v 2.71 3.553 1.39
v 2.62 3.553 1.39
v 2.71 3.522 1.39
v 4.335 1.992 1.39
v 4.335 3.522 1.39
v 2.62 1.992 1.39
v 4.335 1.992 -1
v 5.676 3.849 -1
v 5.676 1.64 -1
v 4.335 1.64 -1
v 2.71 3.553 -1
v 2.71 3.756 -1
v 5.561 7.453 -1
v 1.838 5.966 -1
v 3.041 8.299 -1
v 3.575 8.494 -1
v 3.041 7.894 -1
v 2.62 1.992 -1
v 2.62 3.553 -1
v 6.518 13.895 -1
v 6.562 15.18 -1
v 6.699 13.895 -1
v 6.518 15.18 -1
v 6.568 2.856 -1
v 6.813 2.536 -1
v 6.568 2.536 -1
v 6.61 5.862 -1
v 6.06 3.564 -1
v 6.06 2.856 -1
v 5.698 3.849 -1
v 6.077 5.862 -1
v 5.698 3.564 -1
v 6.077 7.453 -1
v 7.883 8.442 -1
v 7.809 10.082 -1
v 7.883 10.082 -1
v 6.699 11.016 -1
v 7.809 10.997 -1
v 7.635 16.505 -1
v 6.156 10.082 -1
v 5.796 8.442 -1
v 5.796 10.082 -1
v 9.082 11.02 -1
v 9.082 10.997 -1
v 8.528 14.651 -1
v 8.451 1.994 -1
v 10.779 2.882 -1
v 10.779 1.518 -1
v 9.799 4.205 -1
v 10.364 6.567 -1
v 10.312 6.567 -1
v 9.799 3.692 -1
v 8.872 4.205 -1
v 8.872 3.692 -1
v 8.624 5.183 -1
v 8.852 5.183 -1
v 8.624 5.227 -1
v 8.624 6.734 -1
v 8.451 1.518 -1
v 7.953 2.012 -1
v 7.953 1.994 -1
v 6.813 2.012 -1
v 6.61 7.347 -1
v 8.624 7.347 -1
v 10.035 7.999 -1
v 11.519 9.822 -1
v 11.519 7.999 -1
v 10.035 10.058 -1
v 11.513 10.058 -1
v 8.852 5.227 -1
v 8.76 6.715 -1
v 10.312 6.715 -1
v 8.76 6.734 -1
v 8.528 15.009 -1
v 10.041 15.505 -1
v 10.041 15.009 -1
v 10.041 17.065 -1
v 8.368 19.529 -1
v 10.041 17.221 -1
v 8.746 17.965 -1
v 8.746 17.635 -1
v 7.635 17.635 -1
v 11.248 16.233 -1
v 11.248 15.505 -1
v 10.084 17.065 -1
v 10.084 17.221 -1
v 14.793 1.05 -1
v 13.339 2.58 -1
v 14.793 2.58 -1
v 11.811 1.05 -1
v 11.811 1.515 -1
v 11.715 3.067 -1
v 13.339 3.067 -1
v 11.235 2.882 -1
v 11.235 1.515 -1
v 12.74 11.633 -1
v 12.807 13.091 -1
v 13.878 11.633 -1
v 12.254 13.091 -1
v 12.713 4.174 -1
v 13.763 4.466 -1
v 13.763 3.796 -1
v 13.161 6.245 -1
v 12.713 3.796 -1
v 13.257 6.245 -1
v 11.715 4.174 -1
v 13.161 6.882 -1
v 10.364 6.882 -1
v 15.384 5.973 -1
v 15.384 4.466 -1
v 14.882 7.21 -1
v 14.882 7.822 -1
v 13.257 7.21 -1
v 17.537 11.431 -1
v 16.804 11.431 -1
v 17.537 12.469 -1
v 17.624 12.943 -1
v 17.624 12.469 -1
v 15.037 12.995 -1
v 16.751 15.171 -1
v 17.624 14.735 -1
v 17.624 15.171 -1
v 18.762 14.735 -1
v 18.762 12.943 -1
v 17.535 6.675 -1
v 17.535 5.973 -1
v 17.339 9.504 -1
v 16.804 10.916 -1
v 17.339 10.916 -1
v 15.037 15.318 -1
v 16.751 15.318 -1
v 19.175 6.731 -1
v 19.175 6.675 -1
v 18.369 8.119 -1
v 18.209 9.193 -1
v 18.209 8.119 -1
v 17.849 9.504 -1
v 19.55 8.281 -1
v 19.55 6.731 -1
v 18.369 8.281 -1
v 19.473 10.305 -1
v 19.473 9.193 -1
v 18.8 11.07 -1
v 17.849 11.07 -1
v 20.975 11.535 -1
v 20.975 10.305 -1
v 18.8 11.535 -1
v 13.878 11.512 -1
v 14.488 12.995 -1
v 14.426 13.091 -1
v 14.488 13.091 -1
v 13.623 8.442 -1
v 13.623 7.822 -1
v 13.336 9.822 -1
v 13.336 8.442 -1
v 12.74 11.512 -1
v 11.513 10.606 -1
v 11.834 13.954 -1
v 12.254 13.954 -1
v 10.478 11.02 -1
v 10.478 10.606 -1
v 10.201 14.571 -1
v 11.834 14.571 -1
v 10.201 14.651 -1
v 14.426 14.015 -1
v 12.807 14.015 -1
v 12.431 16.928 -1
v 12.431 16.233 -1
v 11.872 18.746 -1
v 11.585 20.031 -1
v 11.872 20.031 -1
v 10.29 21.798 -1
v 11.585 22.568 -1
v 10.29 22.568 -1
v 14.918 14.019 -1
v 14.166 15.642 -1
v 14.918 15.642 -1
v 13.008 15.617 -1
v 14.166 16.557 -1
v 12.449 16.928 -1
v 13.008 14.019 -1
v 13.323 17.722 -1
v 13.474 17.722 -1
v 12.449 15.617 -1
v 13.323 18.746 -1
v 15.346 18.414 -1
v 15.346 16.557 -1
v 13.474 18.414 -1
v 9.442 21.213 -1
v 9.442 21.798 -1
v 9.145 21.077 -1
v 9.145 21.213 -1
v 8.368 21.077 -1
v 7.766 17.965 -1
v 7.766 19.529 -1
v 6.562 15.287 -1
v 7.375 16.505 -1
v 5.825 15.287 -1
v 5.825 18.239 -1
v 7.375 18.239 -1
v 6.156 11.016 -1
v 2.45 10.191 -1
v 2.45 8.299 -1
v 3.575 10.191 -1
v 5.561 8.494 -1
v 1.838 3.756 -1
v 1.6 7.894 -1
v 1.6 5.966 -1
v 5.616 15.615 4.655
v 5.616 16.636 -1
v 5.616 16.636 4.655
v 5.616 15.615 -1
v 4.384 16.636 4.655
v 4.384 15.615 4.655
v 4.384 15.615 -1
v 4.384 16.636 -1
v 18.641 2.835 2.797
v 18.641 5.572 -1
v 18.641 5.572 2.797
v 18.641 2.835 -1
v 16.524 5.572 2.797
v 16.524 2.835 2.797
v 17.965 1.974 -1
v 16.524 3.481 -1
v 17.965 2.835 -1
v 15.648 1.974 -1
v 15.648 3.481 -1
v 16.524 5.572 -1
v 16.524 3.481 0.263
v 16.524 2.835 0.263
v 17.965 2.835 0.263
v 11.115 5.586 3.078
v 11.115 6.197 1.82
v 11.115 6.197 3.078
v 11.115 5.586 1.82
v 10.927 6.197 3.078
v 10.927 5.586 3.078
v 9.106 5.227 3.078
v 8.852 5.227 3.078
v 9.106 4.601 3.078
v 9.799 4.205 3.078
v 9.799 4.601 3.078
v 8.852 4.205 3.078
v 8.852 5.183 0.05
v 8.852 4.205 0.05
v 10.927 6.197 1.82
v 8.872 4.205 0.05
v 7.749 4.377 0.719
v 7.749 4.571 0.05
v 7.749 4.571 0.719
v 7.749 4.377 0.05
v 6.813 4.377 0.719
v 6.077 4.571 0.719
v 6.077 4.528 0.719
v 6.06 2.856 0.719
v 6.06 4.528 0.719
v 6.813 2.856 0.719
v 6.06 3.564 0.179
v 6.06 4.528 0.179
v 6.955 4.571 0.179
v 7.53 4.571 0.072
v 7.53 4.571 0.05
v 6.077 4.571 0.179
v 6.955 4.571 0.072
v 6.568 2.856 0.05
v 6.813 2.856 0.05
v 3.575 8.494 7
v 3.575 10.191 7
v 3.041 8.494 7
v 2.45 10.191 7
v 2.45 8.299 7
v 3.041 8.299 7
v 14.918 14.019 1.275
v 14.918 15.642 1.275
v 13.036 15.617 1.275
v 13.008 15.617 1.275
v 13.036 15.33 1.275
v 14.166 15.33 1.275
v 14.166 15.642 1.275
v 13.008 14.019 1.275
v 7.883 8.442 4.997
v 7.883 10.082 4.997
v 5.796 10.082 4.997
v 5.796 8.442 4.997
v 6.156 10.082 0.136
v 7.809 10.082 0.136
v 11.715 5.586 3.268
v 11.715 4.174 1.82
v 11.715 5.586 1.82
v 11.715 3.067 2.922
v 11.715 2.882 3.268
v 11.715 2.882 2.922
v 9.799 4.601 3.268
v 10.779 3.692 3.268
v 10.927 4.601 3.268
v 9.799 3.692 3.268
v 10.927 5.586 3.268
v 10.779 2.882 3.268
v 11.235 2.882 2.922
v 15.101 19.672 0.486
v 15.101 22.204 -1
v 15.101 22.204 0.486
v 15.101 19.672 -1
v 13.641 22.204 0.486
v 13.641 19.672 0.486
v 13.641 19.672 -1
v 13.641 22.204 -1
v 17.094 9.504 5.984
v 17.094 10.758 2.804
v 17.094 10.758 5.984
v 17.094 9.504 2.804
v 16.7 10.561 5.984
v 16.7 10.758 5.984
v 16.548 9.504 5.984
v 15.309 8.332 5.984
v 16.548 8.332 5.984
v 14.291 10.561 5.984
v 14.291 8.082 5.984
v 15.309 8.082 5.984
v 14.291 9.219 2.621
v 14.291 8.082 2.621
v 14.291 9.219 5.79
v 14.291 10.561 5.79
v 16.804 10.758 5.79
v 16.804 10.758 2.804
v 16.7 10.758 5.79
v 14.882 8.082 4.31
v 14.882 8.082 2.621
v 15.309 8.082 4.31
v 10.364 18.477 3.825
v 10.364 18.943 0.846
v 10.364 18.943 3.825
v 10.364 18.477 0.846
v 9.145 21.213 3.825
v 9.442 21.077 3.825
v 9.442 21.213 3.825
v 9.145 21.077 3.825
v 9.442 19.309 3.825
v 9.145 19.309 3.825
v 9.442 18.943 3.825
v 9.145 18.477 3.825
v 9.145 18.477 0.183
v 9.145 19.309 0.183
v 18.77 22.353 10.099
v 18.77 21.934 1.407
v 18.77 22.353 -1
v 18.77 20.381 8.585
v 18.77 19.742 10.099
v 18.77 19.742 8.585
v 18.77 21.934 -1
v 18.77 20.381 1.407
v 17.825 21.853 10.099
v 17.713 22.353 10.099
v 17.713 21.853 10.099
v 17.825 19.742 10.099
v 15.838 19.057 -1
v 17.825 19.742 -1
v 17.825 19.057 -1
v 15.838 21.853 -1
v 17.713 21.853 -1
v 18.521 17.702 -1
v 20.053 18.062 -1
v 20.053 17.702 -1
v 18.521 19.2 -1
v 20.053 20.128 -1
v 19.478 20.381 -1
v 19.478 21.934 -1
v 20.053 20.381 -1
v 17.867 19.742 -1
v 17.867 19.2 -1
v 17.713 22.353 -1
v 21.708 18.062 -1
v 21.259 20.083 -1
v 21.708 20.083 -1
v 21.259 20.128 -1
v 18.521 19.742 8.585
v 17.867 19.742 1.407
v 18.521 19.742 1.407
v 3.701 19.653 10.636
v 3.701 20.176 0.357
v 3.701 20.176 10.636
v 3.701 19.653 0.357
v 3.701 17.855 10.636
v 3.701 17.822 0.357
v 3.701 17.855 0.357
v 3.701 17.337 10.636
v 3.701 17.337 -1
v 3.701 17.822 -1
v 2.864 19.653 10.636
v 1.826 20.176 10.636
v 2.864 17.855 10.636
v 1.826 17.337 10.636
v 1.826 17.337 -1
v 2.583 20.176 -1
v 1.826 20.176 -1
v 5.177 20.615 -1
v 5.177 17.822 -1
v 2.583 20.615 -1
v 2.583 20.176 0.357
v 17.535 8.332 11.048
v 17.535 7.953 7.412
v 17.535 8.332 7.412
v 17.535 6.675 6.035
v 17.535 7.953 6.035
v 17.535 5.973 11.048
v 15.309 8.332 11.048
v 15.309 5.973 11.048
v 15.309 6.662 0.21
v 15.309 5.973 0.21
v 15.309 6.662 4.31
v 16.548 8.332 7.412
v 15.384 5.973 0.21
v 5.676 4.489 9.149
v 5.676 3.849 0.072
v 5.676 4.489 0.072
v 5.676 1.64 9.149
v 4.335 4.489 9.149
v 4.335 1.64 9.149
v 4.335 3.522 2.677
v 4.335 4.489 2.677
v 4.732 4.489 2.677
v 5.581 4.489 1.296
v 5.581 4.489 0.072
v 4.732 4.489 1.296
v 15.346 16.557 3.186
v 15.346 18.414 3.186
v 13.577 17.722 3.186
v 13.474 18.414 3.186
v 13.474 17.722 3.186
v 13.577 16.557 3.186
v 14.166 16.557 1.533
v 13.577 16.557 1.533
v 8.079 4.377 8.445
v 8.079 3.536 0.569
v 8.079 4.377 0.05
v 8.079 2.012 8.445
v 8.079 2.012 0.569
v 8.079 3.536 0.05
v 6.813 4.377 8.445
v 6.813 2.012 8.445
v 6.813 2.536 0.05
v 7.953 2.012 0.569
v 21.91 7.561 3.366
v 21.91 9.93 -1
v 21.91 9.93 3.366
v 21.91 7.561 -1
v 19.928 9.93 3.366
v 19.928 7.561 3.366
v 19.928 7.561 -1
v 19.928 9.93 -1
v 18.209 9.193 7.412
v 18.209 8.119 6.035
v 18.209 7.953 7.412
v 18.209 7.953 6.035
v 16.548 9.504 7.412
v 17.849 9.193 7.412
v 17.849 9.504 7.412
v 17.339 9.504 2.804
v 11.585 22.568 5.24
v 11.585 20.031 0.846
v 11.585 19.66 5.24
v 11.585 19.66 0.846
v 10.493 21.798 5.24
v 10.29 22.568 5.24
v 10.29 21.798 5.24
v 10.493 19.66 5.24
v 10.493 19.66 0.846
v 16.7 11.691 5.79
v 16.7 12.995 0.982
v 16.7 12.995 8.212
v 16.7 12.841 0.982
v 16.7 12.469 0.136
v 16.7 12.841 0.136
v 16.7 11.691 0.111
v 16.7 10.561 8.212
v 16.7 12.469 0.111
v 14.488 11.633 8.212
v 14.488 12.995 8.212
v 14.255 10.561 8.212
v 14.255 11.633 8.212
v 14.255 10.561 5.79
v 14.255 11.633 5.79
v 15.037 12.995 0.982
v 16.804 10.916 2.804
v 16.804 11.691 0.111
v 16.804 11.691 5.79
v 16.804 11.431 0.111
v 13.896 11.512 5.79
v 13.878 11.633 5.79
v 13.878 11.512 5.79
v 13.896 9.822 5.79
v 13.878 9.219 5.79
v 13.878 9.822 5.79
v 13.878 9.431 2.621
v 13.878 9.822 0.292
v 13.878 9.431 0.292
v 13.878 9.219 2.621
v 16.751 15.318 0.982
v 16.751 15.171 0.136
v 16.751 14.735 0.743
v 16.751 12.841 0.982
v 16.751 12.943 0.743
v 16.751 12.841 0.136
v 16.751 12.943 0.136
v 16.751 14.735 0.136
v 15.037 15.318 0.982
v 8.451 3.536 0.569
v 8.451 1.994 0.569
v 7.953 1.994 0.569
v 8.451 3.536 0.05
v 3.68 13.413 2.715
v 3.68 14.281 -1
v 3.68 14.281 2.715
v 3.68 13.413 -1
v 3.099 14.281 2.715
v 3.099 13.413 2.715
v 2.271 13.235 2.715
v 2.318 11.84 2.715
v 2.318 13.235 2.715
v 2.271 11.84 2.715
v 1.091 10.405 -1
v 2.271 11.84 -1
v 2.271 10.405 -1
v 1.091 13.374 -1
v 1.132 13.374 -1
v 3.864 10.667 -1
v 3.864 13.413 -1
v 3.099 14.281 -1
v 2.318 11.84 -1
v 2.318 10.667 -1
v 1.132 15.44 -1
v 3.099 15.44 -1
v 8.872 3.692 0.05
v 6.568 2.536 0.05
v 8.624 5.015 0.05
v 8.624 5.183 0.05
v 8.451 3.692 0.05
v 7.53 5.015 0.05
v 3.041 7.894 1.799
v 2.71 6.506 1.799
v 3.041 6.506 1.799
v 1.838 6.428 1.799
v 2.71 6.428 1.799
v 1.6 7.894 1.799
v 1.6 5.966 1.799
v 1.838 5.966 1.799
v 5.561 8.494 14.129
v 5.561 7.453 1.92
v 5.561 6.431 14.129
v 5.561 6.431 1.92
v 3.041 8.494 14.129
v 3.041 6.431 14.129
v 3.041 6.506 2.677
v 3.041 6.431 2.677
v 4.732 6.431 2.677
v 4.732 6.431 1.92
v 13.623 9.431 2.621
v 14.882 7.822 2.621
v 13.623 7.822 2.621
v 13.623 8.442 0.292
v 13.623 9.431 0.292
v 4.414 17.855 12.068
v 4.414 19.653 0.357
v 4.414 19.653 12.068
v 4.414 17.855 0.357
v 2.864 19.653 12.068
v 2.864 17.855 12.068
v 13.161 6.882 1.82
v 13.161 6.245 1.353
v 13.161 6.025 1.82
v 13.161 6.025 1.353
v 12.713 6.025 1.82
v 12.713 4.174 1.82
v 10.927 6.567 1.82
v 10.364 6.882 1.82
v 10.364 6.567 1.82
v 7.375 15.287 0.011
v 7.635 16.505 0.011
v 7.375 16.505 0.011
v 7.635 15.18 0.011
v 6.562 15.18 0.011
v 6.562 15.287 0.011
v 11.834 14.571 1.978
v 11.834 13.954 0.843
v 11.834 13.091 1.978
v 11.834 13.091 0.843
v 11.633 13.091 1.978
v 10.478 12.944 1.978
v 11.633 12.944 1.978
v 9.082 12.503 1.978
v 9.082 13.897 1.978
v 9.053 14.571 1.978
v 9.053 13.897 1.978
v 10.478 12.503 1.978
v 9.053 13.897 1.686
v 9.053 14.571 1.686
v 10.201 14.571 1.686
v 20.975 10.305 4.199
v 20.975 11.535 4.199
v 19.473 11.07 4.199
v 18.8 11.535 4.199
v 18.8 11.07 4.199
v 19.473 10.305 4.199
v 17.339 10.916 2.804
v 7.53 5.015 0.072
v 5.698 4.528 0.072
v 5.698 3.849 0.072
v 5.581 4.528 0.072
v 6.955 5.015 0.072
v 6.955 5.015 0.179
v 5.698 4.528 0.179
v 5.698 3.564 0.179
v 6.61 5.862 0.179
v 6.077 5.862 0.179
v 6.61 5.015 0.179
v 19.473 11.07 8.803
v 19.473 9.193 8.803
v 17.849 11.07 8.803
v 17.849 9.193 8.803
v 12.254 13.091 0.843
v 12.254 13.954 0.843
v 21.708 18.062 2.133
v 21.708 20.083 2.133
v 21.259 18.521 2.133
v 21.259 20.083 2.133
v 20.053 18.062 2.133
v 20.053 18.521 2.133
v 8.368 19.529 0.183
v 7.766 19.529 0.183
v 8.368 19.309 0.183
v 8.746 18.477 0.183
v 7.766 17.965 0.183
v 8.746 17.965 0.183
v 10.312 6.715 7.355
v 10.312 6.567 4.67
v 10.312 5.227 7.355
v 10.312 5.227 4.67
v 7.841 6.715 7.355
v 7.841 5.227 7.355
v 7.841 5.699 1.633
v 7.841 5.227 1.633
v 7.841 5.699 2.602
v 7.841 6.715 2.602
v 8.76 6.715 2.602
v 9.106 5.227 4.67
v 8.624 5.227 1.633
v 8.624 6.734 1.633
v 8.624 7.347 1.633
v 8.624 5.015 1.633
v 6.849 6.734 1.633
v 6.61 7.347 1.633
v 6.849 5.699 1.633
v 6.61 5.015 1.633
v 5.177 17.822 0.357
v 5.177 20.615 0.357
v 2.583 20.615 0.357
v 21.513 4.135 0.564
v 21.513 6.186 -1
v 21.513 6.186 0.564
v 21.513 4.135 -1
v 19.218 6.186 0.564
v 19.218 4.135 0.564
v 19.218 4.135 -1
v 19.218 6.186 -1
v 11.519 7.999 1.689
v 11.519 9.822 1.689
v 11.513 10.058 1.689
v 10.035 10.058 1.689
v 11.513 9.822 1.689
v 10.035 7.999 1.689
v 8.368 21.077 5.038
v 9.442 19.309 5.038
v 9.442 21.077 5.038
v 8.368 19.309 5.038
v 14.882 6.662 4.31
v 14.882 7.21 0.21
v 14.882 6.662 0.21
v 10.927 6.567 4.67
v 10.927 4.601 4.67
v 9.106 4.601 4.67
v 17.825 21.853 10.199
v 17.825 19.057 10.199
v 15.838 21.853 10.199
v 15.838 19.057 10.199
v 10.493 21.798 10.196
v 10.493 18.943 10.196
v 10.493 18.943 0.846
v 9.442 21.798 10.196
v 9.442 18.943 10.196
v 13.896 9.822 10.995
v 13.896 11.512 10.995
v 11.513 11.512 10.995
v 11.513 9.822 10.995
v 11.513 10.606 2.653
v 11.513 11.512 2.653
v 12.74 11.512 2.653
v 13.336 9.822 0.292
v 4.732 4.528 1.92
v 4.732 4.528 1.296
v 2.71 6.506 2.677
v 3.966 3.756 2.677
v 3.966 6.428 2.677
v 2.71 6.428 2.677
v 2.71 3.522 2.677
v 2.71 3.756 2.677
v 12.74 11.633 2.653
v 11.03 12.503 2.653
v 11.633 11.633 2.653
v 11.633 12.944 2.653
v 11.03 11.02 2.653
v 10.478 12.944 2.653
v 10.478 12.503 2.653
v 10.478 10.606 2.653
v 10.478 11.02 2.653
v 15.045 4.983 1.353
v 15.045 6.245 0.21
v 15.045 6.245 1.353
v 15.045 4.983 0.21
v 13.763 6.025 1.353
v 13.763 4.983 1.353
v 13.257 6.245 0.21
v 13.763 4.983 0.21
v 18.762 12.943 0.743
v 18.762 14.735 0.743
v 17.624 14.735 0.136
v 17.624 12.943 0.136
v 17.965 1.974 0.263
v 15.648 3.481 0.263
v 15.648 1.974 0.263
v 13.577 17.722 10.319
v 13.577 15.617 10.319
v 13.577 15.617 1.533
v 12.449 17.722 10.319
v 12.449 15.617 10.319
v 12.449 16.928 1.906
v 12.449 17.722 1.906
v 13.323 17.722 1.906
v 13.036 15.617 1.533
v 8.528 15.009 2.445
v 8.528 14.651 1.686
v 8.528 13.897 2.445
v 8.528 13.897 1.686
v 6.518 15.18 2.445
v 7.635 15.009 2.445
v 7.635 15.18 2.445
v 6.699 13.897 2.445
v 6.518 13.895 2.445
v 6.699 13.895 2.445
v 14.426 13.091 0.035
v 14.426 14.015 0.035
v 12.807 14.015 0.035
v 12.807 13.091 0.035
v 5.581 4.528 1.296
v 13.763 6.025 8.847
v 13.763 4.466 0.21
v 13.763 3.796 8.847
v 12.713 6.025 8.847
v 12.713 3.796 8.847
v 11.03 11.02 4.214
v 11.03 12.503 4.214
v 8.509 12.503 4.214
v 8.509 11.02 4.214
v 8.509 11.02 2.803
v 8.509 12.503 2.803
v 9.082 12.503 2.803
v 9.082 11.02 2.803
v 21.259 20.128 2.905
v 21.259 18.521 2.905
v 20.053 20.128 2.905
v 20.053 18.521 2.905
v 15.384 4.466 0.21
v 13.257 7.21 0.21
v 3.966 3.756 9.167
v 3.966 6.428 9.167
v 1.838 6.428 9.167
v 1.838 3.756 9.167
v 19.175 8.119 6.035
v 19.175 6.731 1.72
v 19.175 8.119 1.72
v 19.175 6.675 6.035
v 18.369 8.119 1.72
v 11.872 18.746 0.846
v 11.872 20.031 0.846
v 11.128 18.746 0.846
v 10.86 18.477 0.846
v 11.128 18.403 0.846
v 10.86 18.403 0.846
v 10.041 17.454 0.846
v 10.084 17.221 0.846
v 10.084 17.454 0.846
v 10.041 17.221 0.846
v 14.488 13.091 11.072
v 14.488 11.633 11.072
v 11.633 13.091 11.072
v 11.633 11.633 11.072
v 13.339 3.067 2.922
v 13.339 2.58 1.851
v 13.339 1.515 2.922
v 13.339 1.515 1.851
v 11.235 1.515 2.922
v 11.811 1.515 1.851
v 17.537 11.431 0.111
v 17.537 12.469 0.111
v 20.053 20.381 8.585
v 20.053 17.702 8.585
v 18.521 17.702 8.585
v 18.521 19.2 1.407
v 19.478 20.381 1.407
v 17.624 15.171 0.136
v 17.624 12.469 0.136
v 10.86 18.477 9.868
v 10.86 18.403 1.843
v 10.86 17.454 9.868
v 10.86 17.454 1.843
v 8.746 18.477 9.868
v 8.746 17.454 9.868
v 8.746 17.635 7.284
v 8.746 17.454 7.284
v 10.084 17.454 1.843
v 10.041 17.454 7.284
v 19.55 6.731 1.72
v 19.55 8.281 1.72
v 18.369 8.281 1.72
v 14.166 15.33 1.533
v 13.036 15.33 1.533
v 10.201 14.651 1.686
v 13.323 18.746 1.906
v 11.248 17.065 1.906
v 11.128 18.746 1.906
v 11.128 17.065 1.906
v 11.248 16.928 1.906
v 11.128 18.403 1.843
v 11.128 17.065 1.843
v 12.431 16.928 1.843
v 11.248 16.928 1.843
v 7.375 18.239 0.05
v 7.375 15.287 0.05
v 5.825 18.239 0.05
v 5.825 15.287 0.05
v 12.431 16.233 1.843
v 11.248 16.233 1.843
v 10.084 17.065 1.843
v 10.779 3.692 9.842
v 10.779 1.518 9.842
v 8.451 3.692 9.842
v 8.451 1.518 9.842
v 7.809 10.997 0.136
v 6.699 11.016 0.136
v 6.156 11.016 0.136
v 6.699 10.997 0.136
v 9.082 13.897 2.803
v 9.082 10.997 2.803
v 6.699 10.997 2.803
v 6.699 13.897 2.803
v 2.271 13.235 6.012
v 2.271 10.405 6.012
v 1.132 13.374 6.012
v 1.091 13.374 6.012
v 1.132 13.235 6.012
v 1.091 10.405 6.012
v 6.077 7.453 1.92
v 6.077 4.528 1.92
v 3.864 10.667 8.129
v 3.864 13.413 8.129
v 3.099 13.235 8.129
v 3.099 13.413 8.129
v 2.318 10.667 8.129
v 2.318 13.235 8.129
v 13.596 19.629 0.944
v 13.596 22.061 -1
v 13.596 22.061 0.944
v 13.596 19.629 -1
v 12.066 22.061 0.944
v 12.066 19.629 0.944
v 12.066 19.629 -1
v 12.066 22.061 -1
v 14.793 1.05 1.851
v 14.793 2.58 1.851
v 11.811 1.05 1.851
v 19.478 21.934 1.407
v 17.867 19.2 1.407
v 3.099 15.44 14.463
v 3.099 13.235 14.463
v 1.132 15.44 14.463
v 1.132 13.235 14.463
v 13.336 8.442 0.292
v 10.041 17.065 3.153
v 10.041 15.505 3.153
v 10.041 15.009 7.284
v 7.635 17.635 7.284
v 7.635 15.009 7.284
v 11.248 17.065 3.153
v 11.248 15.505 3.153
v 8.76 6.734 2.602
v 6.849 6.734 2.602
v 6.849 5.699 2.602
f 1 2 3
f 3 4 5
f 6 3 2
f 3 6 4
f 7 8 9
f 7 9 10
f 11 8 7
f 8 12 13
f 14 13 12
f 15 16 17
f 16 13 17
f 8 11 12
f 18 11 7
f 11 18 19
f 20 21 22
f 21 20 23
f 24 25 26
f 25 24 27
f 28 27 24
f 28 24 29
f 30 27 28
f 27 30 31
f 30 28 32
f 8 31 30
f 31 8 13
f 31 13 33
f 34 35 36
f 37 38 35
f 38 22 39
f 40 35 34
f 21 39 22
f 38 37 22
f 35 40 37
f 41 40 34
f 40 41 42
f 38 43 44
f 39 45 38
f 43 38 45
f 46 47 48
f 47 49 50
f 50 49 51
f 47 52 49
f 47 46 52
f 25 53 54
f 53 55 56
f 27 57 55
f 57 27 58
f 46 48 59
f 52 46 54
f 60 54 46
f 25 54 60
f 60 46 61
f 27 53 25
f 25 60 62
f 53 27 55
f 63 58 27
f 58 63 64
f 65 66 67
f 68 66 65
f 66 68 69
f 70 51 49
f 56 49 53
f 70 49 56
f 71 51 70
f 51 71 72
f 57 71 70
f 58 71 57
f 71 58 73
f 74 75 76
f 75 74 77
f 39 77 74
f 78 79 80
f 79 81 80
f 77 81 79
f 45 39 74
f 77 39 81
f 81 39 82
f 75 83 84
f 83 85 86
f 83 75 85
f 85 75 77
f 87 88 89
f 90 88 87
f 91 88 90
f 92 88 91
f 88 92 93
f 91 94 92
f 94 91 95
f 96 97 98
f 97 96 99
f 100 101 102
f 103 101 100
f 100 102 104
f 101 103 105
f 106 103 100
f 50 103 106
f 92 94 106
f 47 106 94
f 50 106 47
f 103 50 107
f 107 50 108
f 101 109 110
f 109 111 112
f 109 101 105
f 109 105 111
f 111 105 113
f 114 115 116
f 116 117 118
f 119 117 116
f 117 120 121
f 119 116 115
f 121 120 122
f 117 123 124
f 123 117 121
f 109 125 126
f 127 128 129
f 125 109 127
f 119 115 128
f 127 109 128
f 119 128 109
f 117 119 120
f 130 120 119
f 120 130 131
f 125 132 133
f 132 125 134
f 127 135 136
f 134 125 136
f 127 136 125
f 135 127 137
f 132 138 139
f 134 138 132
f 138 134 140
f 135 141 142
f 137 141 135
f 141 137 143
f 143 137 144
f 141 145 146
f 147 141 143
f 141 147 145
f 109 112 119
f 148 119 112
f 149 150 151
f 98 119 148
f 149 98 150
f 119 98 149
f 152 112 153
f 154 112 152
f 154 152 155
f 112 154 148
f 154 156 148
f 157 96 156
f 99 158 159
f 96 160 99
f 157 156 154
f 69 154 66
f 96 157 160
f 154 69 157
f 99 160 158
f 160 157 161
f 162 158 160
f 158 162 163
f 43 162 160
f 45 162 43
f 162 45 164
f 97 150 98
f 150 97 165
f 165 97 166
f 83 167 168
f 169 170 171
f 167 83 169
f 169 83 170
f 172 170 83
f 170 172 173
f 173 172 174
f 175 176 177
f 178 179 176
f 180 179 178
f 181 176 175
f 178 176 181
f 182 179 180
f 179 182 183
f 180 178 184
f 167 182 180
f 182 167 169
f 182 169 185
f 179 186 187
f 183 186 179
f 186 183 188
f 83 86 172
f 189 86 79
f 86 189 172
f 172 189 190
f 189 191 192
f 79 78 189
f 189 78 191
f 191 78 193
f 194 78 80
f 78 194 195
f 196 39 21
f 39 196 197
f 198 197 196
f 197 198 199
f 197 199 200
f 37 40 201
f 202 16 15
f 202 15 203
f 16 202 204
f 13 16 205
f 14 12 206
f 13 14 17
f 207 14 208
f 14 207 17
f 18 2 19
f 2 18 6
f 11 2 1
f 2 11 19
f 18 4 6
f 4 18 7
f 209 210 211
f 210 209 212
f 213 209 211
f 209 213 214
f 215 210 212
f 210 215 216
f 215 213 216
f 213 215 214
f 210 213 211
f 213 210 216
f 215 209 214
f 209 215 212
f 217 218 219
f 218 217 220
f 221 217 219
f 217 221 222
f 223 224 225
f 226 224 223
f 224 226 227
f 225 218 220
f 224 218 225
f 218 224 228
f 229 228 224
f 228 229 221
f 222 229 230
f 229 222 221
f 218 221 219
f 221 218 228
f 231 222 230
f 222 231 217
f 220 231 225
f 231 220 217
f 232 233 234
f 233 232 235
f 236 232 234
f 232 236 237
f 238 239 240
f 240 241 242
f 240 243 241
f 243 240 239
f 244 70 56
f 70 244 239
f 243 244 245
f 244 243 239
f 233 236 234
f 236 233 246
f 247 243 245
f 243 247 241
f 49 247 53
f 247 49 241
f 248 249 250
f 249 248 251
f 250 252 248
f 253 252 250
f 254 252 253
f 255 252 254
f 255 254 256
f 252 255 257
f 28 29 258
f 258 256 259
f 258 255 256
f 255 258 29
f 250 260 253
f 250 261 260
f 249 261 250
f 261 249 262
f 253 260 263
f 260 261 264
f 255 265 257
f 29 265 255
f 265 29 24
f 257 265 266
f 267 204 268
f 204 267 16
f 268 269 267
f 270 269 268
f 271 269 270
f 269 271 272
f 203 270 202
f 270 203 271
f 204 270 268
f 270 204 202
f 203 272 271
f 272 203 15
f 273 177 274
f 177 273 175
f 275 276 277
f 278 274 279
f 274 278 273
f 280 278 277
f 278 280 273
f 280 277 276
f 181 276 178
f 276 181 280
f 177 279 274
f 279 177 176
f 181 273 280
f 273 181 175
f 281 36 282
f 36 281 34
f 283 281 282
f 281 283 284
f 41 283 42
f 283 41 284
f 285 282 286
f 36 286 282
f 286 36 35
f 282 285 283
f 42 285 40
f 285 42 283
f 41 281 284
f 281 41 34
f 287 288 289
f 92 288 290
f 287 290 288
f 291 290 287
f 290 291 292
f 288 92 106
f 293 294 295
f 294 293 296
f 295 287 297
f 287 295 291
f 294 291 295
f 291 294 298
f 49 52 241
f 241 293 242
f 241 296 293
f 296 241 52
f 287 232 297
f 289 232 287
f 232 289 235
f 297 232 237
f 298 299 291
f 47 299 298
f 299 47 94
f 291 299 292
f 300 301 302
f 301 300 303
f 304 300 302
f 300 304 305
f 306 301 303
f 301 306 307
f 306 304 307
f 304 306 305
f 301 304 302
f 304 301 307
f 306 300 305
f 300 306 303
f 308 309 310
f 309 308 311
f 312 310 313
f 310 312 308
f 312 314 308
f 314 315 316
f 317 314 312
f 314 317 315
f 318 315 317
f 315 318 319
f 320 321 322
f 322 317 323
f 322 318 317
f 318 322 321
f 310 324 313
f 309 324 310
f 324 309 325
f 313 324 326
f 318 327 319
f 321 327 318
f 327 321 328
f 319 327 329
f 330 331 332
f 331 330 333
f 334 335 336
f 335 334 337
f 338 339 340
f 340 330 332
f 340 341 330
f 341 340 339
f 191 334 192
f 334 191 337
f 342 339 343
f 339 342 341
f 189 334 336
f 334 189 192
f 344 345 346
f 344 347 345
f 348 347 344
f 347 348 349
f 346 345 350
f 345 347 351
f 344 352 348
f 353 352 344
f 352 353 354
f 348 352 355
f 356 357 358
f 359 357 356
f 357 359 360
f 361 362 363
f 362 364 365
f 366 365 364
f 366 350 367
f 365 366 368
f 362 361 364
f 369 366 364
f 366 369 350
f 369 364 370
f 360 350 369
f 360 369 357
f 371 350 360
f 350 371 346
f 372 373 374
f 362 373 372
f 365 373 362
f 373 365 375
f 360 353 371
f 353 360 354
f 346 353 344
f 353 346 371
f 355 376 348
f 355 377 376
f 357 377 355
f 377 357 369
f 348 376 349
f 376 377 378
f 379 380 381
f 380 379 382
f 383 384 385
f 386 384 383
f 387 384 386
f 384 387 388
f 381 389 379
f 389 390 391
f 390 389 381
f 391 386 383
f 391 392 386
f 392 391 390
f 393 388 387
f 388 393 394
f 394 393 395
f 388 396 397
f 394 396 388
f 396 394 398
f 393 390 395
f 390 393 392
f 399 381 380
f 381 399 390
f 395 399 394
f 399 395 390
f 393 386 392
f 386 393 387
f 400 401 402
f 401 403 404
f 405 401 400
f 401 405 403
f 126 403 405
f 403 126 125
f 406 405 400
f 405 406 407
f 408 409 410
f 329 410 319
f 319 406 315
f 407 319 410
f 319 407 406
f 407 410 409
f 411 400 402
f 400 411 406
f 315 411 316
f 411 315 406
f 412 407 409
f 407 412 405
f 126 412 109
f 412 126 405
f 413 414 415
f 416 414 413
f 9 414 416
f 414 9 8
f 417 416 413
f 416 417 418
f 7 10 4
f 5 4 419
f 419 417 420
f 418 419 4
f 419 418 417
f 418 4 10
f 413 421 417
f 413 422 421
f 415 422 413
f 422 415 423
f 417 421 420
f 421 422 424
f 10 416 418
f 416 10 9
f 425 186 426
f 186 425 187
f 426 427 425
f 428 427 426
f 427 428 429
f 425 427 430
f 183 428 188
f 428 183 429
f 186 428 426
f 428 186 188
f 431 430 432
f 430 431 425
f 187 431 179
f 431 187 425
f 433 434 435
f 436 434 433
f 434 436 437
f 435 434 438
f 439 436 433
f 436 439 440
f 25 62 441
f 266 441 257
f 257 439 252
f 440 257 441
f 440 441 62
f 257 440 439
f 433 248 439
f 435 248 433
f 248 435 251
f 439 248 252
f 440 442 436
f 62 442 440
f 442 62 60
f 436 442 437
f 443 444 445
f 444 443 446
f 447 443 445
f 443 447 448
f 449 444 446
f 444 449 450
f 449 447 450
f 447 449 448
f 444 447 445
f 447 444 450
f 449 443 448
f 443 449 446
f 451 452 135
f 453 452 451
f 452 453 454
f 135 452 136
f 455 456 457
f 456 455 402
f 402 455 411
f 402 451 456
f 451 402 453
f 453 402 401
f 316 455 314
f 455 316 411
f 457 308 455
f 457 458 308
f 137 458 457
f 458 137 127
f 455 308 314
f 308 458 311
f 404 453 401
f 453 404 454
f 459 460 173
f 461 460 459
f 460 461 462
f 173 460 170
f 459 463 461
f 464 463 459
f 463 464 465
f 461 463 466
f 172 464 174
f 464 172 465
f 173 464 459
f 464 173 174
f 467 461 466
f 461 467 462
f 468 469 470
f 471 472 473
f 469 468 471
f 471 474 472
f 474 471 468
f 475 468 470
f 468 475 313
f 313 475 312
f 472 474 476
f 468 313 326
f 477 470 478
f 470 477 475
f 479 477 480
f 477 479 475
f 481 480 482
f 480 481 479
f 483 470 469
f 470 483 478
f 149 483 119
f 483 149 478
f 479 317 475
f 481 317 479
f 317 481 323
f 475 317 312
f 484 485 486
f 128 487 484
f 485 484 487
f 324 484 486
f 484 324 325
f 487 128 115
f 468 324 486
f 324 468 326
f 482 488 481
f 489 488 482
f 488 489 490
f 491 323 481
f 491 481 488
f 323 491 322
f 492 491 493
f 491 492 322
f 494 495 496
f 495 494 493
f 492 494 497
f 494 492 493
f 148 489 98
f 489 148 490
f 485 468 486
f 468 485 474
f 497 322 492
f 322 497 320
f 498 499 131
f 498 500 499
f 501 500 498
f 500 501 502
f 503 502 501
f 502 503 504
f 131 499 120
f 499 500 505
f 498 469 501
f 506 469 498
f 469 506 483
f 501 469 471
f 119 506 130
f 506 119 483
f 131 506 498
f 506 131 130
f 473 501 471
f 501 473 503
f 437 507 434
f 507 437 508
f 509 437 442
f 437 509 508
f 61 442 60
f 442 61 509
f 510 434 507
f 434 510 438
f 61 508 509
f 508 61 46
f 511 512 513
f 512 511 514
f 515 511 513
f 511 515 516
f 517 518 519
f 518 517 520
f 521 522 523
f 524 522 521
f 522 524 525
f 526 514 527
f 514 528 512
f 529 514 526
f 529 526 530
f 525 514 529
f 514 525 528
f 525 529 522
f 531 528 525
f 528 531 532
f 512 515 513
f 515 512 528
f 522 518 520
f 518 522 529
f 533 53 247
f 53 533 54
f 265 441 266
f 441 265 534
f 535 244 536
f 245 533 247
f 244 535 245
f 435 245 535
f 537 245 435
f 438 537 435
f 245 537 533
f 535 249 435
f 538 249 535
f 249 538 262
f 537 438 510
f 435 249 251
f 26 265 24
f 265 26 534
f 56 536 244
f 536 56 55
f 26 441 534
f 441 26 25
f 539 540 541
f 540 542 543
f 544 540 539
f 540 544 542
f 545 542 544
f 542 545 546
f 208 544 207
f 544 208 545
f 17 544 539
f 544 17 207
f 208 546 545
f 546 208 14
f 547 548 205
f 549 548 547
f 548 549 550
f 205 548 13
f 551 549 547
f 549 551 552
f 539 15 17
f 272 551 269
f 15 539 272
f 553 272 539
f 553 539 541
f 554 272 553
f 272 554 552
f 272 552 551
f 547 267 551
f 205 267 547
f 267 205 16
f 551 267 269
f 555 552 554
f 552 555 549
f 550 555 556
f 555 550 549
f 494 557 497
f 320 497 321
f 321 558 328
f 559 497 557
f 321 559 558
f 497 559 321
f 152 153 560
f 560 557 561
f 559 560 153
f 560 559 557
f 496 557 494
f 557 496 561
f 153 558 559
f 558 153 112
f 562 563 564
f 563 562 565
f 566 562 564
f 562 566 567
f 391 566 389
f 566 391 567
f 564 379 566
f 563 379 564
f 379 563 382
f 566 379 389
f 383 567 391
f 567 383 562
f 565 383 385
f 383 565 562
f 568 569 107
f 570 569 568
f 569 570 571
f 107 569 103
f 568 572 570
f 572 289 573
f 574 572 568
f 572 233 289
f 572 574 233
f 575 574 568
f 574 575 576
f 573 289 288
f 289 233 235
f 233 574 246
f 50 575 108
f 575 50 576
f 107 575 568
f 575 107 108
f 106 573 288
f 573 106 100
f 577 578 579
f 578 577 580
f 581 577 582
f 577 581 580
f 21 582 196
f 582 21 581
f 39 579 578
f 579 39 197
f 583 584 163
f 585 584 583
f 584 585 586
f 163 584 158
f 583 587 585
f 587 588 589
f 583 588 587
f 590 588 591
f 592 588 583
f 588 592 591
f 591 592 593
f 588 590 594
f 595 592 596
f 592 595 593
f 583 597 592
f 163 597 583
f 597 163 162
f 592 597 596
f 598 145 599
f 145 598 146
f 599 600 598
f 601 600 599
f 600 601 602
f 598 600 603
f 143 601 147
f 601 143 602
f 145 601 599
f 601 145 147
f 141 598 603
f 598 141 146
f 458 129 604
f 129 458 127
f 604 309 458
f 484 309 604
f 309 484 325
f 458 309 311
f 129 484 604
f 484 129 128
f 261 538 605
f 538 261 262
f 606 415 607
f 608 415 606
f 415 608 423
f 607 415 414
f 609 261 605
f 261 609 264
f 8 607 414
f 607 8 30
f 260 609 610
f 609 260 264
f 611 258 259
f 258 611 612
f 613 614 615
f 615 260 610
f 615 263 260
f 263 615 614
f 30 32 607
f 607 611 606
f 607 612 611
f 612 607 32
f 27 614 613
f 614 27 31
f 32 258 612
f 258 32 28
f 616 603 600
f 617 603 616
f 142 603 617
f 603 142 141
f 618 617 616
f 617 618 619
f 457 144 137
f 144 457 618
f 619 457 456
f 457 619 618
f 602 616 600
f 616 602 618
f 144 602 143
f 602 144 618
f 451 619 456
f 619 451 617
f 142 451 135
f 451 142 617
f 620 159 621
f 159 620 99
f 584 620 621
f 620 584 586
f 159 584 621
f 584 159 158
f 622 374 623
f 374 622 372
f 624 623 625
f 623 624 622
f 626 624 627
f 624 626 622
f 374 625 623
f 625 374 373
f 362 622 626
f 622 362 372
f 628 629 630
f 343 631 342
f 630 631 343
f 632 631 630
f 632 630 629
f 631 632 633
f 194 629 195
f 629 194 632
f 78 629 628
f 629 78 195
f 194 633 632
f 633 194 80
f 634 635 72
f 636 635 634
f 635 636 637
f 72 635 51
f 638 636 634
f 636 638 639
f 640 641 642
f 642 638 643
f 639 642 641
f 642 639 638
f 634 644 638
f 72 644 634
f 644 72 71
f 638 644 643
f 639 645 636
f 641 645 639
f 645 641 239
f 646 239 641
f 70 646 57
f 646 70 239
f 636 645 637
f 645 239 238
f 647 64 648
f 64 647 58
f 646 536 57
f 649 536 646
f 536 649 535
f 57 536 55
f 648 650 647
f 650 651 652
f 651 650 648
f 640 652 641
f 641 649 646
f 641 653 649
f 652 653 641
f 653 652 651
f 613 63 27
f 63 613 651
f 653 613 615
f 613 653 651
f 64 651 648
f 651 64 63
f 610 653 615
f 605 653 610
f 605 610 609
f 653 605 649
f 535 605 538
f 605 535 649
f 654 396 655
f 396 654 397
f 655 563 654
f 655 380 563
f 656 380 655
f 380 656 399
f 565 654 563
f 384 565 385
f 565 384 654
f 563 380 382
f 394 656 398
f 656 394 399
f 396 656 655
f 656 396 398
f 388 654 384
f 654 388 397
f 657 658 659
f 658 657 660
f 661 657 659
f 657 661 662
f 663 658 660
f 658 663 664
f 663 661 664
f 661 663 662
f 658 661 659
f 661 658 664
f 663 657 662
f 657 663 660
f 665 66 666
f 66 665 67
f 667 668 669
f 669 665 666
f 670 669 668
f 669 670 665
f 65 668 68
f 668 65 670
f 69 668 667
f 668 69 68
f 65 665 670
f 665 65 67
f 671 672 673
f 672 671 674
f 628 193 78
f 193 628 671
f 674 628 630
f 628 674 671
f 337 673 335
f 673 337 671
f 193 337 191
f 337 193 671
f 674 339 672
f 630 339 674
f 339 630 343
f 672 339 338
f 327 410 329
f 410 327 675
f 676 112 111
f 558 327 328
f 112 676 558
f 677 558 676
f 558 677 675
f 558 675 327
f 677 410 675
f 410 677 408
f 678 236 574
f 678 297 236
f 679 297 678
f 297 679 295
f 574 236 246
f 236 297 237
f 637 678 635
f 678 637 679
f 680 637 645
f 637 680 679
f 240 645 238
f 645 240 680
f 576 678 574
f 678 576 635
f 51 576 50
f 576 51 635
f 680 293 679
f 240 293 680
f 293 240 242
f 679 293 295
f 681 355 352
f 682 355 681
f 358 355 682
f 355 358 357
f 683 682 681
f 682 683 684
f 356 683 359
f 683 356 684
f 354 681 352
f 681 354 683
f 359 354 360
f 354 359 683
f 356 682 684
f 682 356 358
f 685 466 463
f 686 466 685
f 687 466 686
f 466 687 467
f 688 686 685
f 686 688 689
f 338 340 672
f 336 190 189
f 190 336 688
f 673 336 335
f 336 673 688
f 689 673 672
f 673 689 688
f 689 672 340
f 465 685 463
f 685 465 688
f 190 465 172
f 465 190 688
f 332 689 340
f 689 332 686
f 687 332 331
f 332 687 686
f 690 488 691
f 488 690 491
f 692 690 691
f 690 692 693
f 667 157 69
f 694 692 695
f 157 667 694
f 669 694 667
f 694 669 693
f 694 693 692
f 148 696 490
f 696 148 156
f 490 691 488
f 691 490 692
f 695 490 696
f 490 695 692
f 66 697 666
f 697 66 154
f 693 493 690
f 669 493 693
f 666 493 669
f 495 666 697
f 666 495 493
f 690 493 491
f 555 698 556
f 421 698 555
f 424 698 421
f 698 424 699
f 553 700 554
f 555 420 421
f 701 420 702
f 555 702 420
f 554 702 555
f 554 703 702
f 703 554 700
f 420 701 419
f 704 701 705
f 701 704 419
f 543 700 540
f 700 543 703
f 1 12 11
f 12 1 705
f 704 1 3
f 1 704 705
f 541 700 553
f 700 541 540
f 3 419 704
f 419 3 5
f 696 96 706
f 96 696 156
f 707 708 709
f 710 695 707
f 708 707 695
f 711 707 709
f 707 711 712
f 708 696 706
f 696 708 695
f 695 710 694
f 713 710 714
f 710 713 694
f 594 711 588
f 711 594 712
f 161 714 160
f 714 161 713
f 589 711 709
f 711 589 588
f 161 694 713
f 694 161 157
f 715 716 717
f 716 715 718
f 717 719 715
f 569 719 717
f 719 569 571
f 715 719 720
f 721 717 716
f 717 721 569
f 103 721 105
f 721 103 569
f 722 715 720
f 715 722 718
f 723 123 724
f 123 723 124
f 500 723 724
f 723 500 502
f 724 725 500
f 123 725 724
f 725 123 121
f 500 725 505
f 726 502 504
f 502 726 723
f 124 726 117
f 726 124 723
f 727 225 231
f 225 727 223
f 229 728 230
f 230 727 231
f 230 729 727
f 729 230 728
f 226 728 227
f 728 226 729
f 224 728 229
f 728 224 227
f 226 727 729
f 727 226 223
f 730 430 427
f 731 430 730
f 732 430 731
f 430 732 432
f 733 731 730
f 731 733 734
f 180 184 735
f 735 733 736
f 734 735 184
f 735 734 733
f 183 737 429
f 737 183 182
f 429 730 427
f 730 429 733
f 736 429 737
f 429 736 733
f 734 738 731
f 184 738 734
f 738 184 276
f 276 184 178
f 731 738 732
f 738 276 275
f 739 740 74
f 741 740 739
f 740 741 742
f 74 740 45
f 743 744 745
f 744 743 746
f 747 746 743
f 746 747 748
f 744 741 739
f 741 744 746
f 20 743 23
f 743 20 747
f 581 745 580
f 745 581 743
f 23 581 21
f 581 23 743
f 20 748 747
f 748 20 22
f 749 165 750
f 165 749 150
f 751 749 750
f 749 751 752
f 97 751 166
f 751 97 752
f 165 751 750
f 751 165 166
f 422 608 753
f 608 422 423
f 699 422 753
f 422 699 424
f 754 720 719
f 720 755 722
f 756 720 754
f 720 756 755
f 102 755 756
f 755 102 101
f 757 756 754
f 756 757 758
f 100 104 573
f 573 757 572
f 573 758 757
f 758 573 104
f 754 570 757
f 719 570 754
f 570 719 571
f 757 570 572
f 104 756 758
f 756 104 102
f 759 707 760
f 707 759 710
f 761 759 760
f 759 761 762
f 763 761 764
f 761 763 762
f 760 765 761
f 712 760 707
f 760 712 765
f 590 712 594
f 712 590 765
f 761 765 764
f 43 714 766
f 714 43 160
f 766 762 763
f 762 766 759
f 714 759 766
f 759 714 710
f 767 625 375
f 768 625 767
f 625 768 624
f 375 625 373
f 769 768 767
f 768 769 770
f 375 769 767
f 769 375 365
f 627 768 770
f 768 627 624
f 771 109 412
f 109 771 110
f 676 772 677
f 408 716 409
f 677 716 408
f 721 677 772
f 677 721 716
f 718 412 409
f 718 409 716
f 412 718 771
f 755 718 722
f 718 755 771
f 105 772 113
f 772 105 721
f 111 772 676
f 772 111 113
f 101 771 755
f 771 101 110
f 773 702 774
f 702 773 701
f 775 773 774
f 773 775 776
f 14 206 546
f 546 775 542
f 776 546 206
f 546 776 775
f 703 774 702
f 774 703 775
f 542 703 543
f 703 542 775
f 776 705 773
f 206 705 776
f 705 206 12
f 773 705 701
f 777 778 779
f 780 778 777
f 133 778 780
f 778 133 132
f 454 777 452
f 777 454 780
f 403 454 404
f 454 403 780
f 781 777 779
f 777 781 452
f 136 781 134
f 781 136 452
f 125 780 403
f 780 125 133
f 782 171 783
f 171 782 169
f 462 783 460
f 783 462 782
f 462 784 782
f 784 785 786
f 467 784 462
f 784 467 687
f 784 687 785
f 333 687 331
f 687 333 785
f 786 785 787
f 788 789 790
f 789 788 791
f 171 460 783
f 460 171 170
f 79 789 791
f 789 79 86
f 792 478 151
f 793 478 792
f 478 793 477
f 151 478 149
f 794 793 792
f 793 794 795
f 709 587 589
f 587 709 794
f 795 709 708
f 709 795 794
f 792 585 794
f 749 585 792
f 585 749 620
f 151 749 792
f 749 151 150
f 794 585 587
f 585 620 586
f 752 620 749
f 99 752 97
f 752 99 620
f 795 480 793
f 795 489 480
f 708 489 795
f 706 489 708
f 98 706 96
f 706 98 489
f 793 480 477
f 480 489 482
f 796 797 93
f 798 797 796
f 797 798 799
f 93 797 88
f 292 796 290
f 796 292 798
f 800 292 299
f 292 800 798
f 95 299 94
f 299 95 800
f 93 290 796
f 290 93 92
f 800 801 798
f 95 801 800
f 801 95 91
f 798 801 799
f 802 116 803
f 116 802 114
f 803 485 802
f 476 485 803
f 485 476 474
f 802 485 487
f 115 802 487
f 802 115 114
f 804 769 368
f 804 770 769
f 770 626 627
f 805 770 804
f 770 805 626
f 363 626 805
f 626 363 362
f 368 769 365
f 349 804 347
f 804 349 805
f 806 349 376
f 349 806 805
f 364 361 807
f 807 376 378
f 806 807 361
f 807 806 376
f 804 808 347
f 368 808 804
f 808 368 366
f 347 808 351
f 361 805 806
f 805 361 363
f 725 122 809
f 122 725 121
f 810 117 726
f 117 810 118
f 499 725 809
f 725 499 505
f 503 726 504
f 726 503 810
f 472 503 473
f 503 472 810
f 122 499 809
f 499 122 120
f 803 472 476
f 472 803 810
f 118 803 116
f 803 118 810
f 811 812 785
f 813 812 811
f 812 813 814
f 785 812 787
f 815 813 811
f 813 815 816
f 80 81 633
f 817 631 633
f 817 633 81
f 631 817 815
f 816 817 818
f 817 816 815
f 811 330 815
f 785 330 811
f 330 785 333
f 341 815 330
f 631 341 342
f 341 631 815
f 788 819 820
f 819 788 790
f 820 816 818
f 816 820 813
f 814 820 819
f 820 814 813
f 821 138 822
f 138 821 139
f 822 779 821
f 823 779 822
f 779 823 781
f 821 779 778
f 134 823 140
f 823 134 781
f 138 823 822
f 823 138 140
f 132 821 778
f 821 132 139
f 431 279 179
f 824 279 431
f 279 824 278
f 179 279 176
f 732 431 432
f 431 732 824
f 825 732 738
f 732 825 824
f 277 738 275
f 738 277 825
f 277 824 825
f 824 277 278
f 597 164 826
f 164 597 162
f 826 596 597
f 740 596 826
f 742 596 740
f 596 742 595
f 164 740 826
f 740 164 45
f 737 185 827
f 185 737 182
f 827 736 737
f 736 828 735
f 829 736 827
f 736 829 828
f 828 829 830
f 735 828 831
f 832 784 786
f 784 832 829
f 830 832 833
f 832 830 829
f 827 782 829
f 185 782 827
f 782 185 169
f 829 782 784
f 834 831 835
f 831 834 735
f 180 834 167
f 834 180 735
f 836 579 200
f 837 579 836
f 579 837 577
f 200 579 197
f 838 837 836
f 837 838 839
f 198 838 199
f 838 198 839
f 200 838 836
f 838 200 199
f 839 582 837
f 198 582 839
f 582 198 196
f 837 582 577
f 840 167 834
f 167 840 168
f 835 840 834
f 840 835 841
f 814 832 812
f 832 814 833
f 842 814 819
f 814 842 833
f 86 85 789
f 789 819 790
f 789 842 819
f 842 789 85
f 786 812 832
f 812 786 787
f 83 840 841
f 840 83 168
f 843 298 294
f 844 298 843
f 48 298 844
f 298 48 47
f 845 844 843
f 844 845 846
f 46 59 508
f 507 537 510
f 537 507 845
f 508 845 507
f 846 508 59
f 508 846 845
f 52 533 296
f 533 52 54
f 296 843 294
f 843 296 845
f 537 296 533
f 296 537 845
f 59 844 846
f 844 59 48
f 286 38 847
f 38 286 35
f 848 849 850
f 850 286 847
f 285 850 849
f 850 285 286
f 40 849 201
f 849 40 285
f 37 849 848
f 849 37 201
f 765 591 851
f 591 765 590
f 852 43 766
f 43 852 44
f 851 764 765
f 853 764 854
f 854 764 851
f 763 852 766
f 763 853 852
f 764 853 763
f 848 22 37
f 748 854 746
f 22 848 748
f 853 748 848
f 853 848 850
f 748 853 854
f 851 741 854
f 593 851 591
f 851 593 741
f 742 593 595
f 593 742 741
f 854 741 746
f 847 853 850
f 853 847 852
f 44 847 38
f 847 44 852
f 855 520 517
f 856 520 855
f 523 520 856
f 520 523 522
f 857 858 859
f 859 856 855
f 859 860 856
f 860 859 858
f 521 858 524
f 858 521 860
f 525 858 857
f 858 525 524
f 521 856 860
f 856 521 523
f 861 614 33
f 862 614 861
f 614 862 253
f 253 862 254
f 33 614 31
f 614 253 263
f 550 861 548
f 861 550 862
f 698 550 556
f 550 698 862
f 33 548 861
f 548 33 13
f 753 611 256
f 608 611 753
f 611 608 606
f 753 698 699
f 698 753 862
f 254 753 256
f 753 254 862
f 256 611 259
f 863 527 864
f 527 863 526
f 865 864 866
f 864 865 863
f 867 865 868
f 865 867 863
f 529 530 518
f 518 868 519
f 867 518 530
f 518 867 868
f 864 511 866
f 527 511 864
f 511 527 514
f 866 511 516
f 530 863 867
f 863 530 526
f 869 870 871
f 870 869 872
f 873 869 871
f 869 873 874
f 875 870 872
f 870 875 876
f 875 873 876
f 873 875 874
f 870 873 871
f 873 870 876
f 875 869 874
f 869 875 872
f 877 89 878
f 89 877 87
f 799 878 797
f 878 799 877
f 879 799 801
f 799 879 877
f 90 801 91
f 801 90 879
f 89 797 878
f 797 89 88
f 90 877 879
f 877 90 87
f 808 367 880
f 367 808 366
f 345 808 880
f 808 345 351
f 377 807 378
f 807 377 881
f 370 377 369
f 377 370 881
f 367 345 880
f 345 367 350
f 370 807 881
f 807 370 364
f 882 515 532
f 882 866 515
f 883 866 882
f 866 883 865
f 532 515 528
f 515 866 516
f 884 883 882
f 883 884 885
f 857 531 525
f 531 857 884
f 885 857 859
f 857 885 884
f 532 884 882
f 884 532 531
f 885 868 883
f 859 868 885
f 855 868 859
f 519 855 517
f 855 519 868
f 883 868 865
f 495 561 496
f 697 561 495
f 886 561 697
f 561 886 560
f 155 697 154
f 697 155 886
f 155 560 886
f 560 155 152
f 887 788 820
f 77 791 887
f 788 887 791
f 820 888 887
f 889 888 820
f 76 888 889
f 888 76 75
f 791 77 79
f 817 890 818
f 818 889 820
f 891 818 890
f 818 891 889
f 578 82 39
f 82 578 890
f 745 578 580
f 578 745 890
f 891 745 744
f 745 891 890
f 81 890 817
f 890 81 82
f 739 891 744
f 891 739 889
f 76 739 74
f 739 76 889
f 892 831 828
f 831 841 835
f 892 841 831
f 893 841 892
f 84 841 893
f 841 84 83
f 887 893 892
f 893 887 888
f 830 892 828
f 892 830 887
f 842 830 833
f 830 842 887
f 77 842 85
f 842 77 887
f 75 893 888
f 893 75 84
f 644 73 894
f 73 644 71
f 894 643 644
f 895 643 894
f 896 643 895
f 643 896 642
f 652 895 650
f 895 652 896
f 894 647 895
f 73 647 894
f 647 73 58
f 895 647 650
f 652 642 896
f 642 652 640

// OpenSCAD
// file: ultrametrics_primitives.scad
// extended primitives
//
// github.com/pchuck/generative-3d-models
//

// random shortcuts
function rand(min, max) = rands(min, max, 1)[0];
function rand0(max) = rands(0, max, 1)[0];
function rand1(max) = rands(1, max, 1)[0];
function dice(a, b) = rands(-1, 1, 1)[0] > 0 ? a : b;

// a cube centered in 3-space
module cube_centered(s) {
    translate([-s / 2, -s / 2, -s / 2])
    cube(s);
}

// a single side/wall of a cube, with a fixed frame width
// with the specified size, rotation vector and wall width
module cube_wall(s, r, w) {
    ns = s - w * 2;
    rotate(r)
    translate([-ns / 2, -ns / 2, -s / 2])
    cube([ns, ns, w]);
}

// all sides (for subtractively exposing the inside of the cube)
module cube_shell(s, w) {
    cube_wall(s, [  0,   0,  0], w); // top
    cube_wall(s, [  0, 180,  0], w); // bottom
    cube_wall(s, [  0,  90, 90], w); // left
    cube_wall(s, [ 90,  90, 90], w); // back
    cube_wall(s, [180,  90, 90], w); // right
    cube_wall(s, [270,  90, 90], w); // front
}

// a cubic frame (difference between the cube and its walls)
module cube_frame(s, w) {
   fudge = 0.01;
   difference() {
        cube_centered(s - fudge); // cube
        cube_shell(s, w); // minus sides
        cube_centered(s - w * 2 * (1 - fudge));
   }
}

angle = 90;
size = 10;
width = 1;
offset = 20;

// cube centered
translate([offset * 0, 0, 0]) cube_centered(size);

// a few cube walls
translate([offset * 1, 0, 0]) cube_wall(size, [0,         0,     0], width);
translate([offset * 1, 0, 0]) cube_wall(size, [0, angle * 2,     0], width);
translate([offset * 1, 0, 0]) cube_wall(size, [0, angle * 3, angle], width);

// cube shell
translate([offset * 2, 0, 0]) cube_shell(size, width);

// cube frame
translate([offset * 3, 0, 0]) cube_frame(size, width);
// main file
// cube experiments
//
// github.com/pchuck/generative-3d-models
//
use <ultrametrics_primitives.scad>;

// random cubes
module random_cubes() {
    for(i=[0: 1: 10]) {
        translate([i, 0, 0]) cube([rand1(i), rand1(i), rand1(i)]);
    }
}

// random cube pyramid - overhangs, not printable
module random_cube_pyramid() {
    t = 20;
    s = 3;
    translate([0, 0, -1])
    for(z=[0: 1: 10]) {
        for(i=[0: 1: 100]) {
            tz = rand1(t);
            translate([rand(-z, z), rand(-z, z), z]) 
            cube([rand1(s), rand1(s), rand1(s)]);
        }
    }
}

// sparse random cube cloud - not printable!
module sparse_random_cube_cloud() {
    t = 20;
    s = 3;
    translate([0, 0, -1])
    for(i=[0: 1: 100]) {
        tz = rand1(t);
        translate([rand1(t), rand1(t), rand1(t)]) 
          cube([rand1(s), rand1(s), rand1(s)]);
    }
}

// dense random cube cloud - maybe printable?
module dense_random_cube_cloud() {
    t = 20;
    s = 3;
    translate([0, 0, -1])
    for(i=[0: 1: 5000]) {
        tz = rand1(t);
        translate([rand1(t), rand1(t), rand1(t)]) 
          cube([rand1(s), rand1(s), rand1(s)]);
    }
}

// skyscrapers - random tall cubes
module skyscrapers() {
    t = 20;
    s = 3;
    translate([0, 0, -1])
    for(i=[0: 1: 100]) {
        tz = rand1(t);
        translate([rand1(t), rand1(t), 0]) 
        cube([rand1(s), rand1(s), rand1(tz)]);
    }
}

//random_cubes();
//random_cube_pyramid();
//sparse_random_cube_cloud();
//dense_random_cube_cloud();
skyscrapers();
